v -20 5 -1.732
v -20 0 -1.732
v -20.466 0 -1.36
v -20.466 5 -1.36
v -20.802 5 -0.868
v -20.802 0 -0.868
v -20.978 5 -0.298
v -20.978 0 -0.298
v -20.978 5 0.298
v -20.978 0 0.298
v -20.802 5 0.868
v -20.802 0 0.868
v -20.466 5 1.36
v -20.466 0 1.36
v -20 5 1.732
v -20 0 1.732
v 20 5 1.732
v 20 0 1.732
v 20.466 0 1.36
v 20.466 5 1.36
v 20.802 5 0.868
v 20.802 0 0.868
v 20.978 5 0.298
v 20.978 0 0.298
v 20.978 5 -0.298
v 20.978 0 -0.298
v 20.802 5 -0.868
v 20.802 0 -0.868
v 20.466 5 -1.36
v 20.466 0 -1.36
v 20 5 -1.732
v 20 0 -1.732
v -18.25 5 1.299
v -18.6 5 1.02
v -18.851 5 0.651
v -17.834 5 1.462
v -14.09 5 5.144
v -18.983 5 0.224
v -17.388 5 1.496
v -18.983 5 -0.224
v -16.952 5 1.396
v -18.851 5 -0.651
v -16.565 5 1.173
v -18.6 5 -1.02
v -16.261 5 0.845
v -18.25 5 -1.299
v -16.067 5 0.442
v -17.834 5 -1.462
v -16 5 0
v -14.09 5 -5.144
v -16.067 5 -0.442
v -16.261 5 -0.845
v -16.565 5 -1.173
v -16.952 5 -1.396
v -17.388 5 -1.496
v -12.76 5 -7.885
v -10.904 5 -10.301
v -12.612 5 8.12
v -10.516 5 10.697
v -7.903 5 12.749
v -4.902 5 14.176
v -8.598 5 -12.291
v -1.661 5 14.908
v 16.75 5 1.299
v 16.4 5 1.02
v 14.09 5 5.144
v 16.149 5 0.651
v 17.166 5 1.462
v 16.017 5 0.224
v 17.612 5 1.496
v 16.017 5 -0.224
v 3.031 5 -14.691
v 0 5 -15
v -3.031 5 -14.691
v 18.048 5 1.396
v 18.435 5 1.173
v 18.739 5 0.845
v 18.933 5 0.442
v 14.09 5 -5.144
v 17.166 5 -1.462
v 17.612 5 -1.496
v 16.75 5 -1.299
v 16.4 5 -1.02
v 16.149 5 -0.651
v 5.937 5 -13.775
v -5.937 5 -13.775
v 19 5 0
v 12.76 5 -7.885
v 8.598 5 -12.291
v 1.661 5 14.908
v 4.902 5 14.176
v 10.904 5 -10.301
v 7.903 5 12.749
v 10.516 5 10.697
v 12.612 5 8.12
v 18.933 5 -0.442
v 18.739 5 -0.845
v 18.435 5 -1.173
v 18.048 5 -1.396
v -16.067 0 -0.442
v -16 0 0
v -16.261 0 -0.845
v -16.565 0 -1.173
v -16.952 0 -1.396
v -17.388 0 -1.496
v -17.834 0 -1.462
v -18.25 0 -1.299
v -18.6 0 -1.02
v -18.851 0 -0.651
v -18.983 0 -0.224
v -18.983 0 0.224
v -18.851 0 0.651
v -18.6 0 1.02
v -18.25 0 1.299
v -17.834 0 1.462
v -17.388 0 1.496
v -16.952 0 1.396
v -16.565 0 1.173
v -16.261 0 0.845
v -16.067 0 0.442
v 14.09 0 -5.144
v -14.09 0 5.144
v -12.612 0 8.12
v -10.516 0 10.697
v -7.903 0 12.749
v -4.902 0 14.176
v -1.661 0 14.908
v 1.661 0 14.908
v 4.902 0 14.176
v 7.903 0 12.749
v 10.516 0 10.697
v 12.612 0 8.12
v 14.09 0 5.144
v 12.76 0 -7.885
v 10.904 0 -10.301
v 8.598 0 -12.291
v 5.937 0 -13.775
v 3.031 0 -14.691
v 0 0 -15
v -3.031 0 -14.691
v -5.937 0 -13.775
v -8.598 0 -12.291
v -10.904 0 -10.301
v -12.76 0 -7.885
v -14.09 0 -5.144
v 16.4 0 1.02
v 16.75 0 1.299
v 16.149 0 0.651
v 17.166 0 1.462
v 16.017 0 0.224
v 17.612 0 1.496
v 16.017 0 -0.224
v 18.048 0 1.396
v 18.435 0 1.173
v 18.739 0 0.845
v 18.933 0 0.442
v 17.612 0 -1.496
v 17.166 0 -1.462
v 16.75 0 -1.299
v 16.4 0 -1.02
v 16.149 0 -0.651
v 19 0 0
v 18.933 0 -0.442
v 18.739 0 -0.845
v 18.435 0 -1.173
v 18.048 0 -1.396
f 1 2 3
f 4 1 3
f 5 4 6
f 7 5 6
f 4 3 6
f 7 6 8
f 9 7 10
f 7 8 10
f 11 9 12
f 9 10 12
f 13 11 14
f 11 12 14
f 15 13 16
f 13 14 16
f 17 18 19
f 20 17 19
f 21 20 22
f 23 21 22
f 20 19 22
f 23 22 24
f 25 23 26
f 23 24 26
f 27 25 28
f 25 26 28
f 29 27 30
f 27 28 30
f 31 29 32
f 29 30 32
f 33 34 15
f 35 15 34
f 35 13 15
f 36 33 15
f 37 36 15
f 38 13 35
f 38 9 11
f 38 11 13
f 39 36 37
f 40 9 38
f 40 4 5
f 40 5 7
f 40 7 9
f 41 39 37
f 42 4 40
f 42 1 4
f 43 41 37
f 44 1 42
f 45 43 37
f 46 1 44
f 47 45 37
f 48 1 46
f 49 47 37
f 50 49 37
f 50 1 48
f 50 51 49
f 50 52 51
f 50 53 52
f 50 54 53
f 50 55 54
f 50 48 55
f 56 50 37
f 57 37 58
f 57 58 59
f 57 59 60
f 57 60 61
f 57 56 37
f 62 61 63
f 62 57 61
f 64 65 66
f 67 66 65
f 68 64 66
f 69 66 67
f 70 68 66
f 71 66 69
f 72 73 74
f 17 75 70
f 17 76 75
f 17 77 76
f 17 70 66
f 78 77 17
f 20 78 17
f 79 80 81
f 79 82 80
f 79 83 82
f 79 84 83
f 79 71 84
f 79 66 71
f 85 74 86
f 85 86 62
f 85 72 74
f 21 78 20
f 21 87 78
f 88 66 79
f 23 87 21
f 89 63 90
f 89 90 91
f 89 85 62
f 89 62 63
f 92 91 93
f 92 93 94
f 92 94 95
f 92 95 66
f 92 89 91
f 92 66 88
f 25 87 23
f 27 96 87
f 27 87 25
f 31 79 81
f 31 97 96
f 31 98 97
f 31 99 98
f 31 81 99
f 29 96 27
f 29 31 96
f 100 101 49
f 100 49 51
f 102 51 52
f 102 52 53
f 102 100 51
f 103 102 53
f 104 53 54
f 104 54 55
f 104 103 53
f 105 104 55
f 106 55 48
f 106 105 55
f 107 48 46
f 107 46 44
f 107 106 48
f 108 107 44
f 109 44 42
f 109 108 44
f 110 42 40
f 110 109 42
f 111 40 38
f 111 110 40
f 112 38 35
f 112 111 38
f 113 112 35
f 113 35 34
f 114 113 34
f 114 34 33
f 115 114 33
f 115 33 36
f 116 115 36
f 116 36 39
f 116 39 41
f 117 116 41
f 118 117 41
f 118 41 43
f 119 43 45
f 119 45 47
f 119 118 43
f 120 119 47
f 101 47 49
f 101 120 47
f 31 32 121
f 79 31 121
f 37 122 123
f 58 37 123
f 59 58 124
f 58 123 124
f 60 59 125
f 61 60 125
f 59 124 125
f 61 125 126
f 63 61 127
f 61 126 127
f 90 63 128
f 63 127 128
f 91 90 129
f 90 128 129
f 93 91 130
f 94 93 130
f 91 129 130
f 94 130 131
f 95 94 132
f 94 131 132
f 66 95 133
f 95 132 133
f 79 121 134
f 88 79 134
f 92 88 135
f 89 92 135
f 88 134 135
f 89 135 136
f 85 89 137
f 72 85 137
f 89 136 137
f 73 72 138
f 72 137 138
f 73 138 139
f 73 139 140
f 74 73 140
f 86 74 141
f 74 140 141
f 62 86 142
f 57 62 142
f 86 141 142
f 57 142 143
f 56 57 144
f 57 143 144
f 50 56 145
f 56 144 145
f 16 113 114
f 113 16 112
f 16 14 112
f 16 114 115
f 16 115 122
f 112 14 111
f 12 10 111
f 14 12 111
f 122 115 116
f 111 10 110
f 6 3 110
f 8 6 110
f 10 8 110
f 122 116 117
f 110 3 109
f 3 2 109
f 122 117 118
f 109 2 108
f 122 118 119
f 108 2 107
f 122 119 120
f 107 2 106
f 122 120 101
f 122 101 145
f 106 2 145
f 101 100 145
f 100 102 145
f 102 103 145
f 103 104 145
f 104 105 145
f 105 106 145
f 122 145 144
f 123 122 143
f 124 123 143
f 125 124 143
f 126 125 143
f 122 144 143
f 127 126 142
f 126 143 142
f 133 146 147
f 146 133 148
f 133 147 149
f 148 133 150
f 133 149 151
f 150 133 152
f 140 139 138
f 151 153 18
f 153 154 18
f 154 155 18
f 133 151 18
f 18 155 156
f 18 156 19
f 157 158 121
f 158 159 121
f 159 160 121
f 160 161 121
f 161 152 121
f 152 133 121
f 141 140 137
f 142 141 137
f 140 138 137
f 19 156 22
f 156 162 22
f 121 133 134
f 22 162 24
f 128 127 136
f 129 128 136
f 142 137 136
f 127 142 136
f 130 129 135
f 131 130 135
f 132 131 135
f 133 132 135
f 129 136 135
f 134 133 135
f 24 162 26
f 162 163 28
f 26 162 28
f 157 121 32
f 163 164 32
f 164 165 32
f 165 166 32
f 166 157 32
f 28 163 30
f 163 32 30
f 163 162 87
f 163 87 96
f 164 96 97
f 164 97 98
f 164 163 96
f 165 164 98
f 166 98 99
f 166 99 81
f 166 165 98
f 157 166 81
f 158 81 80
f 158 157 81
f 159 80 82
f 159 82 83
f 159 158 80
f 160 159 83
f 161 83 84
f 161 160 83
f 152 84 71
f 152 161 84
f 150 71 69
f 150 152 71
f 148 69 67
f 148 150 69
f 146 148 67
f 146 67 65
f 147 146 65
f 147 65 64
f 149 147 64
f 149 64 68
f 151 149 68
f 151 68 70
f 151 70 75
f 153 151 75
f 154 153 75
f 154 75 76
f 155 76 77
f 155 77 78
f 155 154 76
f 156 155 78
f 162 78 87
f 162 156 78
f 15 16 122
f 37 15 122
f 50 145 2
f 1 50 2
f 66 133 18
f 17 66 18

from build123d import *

# Parameters (mm, degrees)
SKETCH_1_R      = 1.5
EXTRUDE_1_DEPTH = 5


with BuildPart() as part:
    # 草圖1 → 填料-伸長1 (new body)
    with BuildSketch(Plane(origin=(0, 0, 0), x_dir=(1, 0, 0), z_dir=(0, 1, 0))):
        with BuildLine():
            Line((-20, -1.732050808), (-14.090413659, -5.143952072))
            ThreePointArc((-14.090413659, -5.143952072), (0, -15), (14.090413659, -5.143952072))
            Line((14.090413659, -5.143952072), (20, -1.732050808))
            ThreePointArc((20, -1.732050808), (21, 0), (20, 1.732050808))
            Line((20, 1.732050808), (14.090413659, 5.143952072))
            ThreePointArc((14.090413659, 5.143952072), (8.597695008, 12.291445828), (0, 15))
            ThreePointArc((0, 15), (-8.597695008, 12.291445828), (-14.090413659, 5.143952072))
            Line((-14.090413659, 5.143952072), (-20, 1.732050808))
            ThreePointArc((-20, 1.732050808), (-21, 0), (-20, -1.732050808))
        make_face()
        with Locations((-17.5, 0)):
            Circle(SKETCH_1_R, mode=Mode.SUBTRACT)
        with Locations((17.5, 0)):
            Circle(SKETCH_1_R, mode=Mode.SUBTRACT)
    extrude(amount=EXTRUDE_1_DEPTH)


solid = part.part
